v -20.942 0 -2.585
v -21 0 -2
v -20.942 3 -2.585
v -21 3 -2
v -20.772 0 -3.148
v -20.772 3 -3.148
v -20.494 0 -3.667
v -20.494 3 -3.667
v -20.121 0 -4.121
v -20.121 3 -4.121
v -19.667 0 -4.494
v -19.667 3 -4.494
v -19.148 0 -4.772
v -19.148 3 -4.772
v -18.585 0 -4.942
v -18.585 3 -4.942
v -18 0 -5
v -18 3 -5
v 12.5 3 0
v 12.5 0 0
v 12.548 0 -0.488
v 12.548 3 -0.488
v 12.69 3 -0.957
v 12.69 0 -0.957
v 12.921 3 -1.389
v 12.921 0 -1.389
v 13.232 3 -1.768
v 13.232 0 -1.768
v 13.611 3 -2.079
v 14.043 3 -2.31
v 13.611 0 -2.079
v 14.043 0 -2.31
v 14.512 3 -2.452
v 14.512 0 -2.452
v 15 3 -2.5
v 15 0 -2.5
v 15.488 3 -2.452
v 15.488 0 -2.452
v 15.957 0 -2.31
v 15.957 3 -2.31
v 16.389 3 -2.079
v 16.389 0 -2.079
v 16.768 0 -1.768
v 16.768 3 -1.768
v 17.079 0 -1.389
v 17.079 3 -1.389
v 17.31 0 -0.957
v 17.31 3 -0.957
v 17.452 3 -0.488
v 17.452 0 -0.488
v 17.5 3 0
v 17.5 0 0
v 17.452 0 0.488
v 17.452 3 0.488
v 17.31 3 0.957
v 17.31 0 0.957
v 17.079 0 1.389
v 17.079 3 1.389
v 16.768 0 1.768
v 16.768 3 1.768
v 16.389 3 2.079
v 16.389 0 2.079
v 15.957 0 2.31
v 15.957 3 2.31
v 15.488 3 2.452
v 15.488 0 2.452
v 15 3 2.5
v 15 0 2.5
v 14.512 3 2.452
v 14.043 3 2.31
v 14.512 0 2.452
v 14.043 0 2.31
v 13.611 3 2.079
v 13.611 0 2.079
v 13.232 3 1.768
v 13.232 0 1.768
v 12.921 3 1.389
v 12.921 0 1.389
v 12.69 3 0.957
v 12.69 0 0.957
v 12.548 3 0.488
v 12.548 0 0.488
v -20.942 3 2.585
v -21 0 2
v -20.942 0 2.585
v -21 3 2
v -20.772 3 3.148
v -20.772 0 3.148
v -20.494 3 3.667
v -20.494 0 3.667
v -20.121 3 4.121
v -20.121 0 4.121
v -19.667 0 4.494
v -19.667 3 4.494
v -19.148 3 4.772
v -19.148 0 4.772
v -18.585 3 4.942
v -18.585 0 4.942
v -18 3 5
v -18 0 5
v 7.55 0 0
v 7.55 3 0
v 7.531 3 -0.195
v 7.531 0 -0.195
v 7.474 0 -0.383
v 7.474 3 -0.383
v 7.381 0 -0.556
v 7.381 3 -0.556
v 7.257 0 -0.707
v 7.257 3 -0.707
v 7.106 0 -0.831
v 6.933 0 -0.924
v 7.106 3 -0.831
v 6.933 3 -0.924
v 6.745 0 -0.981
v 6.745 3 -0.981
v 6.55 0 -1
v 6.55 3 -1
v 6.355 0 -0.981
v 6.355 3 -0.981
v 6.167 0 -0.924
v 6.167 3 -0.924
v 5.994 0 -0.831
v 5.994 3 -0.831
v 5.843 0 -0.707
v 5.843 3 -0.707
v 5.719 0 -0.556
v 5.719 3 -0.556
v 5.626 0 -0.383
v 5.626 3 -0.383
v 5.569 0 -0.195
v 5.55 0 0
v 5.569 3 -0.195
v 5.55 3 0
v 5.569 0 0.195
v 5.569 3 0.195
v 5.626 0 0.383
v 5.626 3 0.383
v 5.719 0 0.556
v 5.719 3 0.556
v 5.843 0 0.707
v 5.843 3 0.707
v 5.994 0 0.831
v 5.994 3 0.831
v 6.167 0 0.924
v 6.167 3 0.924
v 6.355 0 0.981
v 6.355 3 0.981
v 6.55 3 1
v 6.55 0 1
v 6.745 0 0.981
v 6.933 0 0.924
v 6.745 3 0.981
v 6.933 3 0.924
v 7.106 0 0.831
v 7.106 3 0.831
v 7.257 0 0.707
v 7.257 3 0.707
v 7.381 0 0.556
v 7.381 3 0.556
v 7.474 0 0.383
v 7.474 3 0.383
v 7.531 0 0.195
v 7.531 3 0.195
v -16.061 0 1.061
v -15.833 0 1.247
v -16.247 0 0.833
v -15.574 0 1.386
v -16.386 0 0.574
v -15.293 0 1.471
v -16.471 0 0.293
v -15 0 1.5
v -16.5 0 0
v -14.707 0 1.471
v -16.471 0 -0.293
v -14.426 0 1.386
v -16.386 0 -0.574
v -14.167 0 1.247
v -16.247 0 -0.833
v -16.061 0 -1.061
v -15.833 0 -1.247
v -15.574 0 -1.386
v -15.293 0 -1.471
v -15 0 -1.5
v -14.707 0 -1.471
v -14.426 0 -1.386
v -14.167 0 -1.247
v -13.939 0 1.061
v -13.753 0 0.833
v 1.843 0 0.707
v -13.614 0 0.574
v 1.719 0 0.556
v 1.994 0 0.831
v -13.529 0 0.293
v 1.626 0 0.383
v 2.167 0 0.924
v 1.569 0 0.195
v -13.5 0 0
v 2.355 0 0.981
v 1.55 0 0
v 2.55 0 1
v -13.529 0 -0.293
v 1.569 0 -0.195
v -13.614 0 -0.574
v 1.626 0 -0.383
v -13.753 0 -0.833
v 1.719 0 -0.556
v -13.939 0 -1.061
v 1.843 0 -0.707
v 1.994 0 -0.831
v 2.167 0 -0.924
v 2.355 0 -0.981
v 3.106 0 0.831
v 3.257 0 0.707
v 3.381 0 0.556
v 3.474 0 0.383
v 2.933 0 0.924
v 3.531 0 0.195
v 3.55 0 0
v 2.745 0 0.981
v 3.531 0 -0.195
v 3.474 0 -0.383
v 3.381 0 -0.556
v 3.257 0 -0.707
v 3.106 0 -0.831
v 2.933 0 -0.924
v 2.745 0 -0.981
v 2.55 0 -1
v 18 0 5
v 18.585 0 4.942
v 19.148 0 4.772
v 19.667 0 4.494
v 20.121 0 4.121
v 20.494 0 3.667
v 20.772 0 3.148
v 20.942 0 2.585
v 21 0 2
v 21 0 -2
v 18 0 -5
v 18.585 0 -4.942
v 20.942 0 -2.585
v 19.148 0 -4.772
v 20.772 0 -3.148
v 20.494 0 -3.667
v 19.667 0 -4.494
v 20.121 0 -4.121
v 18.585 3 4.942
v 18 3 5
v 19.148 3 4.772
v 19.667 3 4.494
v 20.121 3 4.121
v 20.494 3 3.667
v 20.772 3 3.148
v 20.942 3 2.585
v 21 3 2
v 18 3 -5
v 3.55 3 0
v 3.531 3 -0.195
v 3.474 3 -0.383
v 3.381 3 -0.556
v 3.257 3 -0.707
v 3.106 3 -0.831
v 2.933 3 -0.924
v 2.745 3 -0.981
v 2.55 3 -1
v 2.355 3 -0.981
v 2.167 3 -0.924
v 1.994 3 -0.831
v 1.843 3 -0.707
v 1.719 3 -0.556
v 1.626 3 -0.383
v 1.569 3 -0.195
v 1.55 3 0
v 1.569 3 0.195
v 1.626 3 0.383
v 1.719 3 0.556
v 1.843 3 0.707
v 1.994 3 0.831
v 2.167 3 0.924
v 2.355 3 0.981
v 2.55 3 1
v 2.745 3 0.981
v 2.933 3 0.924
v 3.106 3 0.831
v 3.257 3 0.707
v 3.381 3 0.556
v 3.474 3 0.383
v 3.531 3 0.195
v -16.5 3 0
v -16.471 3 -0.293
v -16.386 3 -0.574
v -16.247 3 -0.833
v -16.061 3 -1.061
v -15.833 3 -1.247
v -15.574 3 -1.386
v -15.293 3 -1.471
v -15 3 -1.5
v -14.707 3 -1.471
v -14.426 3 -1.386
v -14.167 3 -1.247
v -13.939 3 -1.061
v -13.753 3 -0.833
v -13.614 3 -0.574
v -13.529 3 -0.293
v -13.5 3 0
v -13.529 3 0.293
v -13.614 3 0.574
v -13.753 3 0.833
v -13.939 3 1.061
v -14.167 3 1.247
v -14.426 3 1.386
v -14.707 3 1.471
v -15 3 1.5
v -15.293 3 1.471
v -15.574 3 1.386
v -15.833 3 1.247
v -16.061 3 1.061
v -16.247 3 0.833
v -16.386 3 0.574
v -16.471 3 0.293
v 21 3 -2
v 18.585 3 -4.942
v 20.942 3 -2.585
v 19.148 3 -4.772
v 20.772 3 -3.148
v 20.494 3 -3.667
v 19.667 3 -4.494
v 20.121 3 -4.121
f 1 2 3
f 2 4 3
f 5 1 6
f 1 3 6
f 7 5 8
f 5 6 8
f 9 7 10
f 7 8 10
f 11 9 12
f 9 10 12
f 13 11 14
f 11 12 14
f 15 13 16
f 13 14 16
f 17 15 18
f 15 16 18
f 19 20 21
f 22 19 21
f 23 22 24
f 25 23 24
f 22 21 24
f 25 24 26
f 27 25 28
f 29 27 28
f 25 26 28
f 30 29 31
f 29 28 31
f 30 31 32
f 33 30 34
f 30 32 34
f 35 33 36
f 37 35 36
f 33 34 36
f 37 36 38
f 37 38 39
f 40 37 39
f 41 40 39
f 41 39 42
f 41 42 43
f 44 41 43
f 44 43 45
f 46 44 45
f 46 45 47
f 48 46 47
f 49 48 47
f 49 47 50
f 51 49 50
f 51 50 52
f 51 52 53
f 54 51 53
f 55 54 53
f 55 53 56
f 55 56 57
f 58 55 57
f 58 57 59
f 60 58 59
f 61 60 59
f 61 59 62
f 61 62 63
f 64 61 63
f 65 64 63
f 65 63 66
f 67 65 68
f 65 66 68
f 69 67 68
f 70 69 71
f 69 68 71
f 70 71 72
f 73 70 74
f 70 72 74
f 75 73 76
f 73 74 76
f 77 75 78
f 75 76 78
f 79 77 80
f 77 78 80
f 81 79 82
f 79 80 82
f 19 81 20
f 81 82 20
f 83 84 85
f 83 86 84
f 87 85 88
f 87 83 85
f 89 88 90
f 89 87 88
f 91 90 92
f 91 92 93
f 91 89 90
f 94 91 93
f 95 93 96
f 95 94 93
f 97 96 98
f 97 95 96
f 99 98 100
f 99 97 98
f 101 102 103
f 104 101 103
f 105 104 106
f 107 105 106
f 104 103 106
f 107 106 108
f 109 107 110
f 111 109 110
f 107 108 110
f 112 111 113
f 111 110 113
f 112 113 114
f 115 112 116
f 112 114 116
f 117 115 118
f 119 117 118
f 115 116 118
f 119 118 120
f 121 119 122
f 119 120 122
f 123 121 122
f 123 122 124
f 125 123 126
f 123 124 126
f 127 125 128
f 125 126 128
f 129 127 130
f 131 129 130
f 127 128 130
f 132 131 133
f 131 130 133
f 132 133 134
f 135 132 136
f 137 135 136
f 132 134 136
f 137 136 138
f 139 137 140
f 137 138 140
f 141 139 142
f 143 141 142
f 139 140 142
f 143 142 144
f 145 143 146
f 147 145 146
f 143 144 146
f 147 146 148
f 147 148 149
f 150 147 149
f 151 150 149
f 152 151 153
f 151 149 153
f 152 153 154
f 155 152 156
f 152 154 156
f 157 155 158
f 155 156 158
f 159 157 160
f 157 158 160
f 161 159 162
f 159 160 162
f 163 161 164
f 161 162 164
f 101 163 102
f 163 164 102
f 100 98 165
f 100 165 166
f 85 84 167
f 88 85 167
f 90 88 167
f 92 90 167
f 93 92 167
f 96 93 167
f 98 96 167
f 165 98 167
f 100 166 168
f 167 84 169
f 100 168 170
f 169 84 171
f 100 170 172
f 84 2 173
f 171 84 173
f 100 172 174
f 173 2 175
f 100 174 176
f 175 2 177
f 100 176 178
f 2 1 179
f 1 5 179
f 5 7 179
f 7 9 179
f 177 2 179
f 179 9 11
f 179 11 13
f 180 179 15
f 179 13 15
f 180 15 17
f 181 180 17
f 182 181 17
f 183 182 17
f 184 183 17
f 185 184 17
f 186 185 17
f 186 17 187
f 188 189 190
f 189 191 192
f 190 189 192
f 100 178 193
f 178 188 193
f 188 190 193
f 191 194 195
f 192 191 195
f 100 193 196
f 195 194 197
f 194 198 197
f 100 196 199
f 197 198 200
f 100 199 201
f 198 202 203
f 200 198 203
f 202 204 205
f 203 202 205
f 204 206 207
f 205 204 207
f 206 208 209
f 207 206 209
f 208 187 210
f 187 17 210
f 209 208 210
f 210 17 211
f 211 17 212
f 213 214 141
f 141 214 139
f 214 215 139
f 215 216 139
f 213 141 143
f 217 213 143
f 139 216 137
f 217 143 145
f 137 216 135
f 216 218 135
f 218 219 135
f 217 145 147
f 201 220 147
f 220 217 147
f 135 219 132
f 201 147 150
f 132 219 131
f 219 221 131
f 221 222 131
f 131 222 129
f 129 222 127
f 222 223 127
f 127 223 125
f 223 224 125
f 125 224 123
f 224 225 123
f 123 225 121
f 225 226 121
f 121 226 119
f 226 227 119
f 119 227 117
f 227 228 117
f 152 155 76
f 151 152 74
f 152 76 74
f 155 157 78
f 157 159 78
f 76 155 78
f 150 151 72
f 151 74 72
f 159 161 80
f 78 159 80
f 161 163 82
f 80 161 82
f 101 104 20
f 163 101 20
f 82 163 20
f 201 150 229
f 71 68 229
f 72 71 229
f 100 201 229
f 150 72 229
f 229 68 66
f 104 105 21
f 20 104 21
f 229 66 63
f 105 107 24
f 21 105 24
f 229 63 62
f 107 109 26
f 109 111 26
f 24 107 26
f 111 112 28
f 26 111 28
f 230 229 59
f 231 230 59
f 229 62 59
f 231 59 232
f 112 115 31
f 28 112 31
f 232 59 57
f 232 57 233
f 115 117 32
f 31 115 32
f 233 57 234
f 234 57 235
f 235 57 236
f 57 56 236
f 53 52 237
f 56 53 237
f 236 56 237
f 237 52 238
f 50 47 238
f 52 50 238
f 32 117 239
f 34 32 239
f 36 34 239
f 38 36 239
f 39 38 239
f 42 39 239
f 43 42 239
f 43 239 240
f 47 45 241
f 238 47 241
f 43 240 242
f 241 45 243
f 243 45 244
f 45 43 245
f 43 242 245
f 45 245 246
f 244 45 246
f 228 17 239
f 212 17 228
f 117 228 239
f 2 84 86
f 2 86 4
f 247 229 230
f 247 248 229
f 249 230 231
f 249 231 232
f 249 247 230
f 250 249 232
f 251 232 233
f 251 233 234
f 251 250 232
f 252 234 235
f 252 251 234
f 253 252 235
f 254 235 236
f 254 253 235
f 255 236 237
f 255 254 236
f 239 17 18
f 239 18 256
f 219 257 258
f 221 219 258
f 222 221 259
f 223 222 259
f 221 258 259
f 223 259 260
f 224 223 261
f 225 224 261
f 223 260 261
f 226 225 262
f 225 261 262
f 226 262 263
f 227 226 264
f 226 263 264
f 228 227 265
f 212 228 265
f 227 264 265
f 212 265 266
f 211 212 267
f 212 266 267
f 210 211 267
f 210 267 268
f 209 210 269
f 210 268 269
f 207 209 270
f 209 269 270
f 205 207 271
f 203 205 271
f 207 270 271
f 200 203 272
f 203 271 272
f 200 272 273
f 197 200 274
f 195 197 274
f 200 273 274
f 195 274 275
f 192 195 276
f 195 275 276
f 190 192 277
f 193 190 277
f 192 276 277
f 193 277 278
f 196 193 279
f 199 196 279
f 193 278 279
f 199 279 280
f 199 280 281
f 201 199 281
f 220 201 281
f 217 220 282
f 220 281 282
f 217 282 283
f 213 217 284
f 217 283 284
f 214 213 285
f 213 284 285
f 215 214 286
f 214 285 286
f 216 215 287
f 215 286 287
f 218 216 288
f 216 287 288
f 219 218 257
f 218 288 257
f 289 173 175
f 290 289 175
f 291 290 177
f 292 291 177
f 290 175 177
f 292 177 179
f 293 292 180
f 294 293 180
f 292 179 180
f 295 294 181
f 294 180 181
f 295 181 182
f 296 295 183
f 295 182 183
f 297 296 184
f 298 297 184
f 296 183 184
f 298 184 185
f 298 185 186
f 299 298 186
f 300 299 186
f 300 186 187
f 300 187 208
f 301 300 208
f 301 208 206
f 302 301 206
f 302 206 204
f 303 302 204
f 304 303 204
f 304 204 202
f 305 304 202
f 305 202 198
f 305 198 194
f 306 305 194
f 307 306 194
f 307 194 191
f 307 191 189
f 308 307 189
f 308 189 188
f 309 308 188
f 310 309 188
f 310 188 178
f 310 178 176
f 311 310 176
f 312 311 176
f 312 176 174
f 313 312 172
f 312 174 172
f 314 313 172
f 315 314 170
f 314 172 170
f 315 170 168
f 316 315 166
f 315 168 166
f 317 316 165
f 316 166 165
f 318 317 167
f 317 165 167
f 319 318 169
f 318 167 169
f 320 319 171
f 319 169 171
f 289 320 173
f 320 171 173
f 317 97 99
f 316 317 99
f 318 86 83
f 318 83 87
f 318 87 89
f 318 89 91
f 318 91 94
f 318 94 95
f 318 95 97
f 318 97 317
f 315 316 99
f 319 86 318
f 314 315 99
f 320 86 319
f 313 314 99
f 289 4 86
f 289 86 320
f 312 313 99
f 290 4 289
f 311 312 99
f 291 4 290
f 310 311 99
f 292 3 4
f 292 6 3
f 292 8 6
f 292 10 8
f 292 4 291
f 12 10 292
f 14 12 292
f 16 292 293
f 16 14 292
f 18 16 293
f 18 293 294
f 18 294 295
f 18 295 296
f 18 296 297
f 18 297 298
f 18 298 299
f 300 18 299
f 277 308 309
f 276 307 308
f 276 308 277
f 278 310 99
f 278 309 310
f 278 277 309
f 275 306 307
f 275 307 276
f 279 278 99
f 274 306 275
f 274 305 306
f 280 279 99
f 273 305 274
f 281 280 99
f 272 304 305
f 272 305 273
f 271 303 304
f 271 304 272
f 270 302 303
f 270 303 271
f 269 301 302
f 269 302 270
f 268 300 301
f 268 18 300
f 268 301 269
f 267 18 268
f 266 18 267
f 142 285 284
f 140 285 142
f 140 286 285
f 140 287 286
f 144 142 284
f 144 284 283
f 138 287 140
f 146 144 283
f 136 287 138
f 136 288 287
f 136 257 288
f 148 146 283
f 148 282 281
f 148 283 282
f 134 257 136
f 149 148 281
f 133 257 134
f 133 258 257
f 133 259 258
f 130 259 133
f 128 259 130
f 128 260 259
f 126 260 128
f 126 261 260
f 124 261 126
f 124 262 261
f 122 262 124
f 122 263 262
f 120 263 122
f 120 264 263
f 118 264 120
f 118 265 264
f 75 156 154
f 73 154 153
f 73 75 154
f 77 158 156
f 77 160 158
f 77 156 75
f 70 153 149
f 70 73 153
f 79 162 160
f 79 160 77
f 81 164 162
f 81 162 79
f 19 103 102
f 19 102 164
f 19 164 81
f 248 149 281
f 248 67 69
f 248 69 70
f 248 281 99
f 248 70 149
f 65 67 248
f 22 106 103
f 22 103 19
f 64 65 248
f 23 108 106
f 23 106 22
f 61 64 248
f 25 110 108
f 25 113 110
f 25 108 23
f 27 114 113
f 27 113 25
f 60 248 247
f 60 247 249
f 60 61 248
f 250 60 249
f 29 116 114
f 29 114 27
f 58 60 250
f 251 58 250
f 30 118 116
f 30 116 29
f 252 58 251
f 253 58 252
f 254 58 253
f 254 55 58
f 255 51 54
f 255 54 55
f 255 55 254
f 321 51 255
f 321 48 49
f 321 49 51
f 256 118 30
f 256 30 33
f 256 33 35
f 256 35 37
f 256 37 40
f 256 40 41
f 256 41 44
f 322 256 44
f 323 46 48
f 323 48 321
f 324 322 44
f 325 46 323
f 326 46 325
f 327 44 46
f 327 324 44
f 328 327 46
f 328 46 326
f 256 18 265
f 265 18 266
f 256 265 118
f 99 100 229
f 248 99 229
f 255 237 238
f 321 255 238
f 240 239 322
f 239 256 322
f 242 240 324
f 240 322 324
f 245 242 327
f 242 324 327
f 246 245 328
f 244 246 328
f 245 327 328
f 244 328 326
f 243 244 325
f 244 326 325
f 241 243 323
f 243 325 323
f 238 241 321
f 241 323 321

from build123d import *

# Parameters (mm, degrees)
SKETCH1_W             = 42
SKETCH1_H             = 10
BOSS_EXTRUDE1_DEPTH   = 3
F_5_0MM_DOWEL_HOLE1_D = 5
F_3_0MM_DOWEL_HOLE1_D = 3
SKETCH2_R             = 1
CUT_EXTRUDE1_DEPTH    = 3
FILLET1_R             = 3


with BuildPart() as part:
    # Sketch1 → Boss-Extrude1 (new body)
    with BuildSketch(Plane(origin=(0, 0, 0), x_dir=(1, 0, 0), z_dir=(0, 1, 0))):
        Rectangle(SKETCH1_W, SKETCH1_H)
    extrude(amount=BOSS_EXTRUDE1_DEPTH)

    # Ø5.0mm Dowel Hole1 (through all)
    with Locations(Plane(origin=(0, 3, 0), x_dir=(1, 0, 0), z_dir=(0, 1, 0))):
        with Locations((15, 0)):
            Hole(F_5_0MM_DOWEL_HOLE1_D / 2)

    # Ø3.0mm Dowel Hole1 (through all)
    with Locations(Plane(origin=(0, 3, 0), x_dir=(1, 0, 0), z_dir=(0, 1, 0))):
        with Locations((-15, 0)):
            Hole(F_3_0MM_DOWEL_HOLE1_D / 2)

    # Sketch2 → Cut-Extrude1 (cut)
    with BuildSketch(Plane(origin=(0, 3, 0), x_dir=(1, 0, 0), z_dir=(0, 1, 0))):
        with Locations((6.55, 0)):
            Circle(SKETCH2_R)
        with Locations((2.55, 0)):
            Circle(SKETCH2_R)
    extrude(amount=-CUT_EXTRUDE1_DEPTH, mode=Mode.SUBTRACT)

    # Fillet1
    fillet1_edges = [part.edges().sort_by_distance(p)[0] for p in [
        (21, 1.5, 5),
        (-21, 1.5, 5),
        (-21, 1.5, -5),
        (21, 1.5, -5),
    ]]
    fillet(fillet1_edges, radius=FILLET1_R)


solid = part.part
